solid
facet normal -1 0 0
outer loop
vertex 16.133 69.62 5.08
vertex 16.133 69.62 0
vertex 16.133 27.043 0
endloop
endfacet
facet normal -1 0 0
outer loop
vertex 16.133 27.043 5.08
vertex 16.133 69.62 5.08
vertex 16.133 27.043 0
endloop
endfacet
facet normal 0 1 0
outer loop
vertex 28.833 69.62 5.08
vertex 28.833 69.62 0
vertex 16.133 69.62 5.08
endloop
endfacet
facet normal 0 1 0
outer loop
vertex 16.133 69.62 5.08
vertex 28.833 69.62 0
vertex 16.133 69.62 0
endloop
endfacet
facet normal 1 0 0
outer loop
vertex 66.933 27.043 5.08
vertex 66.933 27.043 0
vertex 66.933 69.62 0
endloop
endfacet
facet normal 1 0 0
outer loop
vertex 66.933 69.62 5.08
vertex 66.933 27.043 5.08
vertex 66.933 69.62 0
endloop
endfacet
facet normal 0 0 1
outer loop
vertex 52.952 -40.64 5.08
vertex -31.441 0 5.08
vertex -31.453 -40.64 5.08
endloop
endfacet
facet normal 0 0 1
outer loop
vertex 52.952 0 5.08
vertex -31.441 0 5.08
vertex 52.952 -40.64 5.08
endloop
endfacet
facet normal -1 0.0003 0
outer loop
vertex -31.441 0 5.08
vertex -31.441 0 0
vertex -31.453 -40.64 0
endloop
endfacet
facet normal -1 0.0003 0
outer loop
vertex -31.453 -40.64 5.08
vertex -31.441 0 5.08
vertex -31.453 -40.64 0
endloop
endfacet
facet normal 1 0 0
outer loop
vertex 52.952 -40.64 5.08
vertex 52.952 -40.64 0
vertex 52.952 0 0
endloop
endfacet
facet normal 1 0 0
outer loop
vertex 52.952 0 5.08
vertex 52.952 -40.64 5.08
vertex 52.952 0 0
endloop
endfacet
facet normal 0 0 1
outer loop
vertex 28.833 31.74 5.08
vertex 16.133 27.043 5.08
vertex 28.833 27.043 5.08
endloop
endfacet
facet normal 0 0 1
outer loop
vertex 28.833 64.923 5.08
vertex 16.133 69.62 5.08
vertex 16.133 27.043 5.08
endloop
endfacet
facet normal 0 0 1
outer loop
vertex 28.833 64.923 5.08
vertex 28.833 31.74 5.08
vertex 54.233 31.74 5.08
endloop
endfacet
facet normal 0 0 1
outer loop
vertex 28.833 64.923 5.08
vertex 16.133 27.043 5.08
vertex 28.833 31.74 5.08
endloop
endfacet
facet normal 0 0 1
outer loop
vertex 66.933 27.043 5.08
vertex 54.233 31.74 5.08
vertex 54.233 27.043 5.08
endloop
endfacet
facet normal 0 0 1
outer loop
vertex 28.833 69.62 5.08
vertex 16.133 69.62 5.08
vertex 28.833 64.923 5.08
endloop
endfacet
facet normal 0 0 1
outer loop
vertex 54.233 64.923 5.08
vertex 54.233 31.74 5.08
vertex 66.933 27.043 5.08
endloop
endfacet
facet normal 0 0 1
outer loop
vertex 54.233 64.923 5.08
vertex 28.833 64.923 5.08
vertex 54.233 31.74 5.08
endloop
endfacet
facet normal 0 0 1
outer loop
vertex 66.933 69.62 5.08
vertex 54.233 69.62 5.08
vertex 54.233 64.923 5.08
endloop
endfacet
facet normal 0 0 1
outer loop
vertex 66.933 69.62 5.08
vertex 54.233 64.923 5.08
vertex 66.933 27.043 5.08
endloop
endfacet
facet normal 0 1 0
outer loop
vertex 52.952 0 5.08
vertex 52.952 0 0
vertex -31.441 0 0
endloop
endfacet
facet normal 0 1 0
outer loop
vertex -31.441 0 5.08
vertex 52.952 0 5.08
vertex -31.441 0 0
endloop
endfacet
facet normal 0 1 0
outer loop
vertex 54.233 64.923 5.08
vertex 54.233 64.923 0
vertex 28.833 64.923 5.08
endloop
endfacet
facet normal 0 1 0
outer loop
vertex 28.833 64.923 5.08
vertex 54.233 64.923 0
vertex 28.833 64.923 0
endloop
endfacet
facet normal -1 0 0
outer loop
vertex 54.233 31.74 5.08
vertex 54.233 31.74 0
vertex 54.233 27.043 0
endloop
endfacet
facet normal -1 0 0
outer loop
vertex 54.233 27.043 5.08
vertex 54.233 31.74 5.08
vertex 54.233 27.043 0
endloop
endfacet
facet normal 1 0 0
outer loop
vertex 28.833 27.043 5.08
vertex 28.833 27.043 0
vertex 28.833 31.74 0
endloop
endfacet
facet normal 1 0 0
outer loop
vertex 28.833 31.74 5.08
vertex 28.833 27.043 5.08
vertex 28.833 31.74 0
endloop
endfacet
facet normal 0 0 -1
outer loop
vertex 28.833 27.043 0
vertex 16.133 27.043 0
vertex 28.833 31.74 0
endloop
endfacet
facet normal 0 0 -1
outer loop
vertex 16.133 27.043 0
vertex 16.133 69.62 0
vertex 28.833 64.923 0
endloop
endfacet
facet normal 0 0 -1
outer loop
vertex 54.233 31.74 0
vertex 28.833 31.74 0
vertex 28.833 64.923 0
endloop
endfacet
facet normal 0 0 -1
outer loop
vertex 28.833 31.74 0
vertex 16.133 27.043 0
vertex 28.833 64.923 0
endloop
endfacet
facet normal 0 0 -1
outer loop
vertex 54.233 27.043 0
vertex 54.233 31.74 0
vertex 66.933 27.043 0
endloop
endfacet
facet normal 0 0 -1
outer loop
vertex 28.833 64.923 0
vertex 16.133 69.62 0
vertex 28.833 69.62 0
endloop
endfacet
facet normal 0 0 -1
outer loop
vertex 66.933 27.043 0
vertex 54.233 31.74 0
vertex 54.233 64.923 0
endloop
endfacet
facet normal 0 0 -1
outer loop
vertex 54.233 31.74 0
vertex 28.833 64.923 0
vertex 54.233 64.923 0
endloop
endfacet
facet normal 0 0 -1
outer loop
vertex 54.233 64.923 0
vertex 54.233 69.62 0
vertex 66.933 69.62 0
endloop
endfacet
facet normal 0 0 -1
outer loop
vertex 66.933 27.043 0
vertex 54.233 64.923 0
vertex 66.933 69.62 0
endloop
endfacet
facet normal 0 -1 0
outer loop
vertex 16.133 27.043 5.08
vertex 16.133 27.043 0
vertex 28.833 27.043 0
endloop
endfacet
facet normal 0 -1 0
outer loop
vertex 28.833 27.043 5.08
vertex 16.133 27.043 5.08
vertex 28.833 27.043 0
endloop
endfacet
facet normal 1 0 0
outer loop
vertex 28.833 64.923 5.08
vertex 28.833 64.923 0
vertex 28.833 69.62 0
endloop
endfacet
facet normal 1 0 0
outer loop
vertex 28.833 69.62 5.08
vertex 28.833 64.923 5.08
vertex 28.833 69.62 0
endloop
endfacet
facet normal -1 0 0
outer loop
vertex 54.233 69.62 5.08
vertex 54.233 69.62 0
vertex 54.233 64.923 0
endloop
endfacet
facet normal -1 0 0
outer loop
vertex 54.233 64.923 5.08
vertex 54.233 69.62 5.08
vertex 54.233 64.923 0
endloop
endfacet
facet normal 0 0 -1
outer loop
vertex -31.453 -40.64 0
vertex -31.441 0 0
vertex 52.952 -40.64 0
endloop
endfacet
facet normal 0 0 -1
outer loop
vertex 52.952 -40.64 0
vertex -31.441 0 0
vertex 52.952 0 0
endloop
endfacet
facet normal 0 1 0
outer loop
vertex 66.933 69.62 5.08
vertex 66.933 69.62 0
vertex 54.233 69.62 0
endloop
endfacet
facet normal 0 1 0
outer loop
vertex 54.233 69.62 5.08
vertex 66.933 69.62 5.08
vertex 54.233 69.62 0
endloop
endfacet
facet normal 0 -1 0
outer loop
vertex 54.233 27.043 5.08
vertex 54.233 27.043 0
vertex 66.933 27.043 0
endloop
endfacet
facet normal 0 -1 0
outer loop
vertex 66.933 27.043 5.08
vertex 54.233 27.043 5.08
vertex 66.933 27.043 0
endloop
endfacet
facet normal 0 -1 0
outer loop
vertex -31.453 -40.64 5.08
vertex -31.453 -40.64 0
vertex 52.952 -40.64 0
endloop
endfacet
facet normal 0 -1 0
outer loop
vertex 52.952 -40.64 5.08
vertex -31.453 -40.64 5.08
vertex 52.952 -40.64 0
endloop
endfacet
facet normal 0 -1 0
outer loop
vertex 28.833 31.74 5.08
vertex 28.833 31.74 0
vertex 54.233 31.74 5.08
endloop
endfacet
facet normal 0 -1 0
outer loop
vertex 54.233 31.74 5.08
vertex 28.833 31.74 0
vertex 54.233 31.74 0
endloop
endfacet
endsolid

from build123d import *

# Parameters (mm, degrees)
F2_DEPTH = 5.08
F3_DEPTH = 5.08


with BuildPart() as f2:
    # F1 (on Top) → F2 (new body)
    with BuildSketch(Plane.XY):
        Polygon((28.832783, 69.620014), (16.132783, 69.620014), (16.132783, 27.043017), (28.832783, 27.043017), (28.832783, 31.740172), (41.532783, 31.740172), (54.232783, 31.740172), (54.232783, 27.043017), (66.932783, 27.043017), (66.932783, 69.620014), (54.232783, 69.620014), (54.232783, 64.922858), (41.532783, 64.922858), (28.832783, 64.922858), align=None)
    extrude(amount=F2_DEPTH)


with BuildPart() as f3:
    # F0 (on Top) → F3 (new body)
    with BuildSketch(Plane.XY):
        Polygon((52.952456, -40.64), (52.952456, 0), (14.266956, 0), (-31.44131, 0), (-31.453044, -40.64), (14.266956, -40.64), align=None)
    extrude(amount=F3_DEPTH)


solid = Compound([f2.part, f3.part])
